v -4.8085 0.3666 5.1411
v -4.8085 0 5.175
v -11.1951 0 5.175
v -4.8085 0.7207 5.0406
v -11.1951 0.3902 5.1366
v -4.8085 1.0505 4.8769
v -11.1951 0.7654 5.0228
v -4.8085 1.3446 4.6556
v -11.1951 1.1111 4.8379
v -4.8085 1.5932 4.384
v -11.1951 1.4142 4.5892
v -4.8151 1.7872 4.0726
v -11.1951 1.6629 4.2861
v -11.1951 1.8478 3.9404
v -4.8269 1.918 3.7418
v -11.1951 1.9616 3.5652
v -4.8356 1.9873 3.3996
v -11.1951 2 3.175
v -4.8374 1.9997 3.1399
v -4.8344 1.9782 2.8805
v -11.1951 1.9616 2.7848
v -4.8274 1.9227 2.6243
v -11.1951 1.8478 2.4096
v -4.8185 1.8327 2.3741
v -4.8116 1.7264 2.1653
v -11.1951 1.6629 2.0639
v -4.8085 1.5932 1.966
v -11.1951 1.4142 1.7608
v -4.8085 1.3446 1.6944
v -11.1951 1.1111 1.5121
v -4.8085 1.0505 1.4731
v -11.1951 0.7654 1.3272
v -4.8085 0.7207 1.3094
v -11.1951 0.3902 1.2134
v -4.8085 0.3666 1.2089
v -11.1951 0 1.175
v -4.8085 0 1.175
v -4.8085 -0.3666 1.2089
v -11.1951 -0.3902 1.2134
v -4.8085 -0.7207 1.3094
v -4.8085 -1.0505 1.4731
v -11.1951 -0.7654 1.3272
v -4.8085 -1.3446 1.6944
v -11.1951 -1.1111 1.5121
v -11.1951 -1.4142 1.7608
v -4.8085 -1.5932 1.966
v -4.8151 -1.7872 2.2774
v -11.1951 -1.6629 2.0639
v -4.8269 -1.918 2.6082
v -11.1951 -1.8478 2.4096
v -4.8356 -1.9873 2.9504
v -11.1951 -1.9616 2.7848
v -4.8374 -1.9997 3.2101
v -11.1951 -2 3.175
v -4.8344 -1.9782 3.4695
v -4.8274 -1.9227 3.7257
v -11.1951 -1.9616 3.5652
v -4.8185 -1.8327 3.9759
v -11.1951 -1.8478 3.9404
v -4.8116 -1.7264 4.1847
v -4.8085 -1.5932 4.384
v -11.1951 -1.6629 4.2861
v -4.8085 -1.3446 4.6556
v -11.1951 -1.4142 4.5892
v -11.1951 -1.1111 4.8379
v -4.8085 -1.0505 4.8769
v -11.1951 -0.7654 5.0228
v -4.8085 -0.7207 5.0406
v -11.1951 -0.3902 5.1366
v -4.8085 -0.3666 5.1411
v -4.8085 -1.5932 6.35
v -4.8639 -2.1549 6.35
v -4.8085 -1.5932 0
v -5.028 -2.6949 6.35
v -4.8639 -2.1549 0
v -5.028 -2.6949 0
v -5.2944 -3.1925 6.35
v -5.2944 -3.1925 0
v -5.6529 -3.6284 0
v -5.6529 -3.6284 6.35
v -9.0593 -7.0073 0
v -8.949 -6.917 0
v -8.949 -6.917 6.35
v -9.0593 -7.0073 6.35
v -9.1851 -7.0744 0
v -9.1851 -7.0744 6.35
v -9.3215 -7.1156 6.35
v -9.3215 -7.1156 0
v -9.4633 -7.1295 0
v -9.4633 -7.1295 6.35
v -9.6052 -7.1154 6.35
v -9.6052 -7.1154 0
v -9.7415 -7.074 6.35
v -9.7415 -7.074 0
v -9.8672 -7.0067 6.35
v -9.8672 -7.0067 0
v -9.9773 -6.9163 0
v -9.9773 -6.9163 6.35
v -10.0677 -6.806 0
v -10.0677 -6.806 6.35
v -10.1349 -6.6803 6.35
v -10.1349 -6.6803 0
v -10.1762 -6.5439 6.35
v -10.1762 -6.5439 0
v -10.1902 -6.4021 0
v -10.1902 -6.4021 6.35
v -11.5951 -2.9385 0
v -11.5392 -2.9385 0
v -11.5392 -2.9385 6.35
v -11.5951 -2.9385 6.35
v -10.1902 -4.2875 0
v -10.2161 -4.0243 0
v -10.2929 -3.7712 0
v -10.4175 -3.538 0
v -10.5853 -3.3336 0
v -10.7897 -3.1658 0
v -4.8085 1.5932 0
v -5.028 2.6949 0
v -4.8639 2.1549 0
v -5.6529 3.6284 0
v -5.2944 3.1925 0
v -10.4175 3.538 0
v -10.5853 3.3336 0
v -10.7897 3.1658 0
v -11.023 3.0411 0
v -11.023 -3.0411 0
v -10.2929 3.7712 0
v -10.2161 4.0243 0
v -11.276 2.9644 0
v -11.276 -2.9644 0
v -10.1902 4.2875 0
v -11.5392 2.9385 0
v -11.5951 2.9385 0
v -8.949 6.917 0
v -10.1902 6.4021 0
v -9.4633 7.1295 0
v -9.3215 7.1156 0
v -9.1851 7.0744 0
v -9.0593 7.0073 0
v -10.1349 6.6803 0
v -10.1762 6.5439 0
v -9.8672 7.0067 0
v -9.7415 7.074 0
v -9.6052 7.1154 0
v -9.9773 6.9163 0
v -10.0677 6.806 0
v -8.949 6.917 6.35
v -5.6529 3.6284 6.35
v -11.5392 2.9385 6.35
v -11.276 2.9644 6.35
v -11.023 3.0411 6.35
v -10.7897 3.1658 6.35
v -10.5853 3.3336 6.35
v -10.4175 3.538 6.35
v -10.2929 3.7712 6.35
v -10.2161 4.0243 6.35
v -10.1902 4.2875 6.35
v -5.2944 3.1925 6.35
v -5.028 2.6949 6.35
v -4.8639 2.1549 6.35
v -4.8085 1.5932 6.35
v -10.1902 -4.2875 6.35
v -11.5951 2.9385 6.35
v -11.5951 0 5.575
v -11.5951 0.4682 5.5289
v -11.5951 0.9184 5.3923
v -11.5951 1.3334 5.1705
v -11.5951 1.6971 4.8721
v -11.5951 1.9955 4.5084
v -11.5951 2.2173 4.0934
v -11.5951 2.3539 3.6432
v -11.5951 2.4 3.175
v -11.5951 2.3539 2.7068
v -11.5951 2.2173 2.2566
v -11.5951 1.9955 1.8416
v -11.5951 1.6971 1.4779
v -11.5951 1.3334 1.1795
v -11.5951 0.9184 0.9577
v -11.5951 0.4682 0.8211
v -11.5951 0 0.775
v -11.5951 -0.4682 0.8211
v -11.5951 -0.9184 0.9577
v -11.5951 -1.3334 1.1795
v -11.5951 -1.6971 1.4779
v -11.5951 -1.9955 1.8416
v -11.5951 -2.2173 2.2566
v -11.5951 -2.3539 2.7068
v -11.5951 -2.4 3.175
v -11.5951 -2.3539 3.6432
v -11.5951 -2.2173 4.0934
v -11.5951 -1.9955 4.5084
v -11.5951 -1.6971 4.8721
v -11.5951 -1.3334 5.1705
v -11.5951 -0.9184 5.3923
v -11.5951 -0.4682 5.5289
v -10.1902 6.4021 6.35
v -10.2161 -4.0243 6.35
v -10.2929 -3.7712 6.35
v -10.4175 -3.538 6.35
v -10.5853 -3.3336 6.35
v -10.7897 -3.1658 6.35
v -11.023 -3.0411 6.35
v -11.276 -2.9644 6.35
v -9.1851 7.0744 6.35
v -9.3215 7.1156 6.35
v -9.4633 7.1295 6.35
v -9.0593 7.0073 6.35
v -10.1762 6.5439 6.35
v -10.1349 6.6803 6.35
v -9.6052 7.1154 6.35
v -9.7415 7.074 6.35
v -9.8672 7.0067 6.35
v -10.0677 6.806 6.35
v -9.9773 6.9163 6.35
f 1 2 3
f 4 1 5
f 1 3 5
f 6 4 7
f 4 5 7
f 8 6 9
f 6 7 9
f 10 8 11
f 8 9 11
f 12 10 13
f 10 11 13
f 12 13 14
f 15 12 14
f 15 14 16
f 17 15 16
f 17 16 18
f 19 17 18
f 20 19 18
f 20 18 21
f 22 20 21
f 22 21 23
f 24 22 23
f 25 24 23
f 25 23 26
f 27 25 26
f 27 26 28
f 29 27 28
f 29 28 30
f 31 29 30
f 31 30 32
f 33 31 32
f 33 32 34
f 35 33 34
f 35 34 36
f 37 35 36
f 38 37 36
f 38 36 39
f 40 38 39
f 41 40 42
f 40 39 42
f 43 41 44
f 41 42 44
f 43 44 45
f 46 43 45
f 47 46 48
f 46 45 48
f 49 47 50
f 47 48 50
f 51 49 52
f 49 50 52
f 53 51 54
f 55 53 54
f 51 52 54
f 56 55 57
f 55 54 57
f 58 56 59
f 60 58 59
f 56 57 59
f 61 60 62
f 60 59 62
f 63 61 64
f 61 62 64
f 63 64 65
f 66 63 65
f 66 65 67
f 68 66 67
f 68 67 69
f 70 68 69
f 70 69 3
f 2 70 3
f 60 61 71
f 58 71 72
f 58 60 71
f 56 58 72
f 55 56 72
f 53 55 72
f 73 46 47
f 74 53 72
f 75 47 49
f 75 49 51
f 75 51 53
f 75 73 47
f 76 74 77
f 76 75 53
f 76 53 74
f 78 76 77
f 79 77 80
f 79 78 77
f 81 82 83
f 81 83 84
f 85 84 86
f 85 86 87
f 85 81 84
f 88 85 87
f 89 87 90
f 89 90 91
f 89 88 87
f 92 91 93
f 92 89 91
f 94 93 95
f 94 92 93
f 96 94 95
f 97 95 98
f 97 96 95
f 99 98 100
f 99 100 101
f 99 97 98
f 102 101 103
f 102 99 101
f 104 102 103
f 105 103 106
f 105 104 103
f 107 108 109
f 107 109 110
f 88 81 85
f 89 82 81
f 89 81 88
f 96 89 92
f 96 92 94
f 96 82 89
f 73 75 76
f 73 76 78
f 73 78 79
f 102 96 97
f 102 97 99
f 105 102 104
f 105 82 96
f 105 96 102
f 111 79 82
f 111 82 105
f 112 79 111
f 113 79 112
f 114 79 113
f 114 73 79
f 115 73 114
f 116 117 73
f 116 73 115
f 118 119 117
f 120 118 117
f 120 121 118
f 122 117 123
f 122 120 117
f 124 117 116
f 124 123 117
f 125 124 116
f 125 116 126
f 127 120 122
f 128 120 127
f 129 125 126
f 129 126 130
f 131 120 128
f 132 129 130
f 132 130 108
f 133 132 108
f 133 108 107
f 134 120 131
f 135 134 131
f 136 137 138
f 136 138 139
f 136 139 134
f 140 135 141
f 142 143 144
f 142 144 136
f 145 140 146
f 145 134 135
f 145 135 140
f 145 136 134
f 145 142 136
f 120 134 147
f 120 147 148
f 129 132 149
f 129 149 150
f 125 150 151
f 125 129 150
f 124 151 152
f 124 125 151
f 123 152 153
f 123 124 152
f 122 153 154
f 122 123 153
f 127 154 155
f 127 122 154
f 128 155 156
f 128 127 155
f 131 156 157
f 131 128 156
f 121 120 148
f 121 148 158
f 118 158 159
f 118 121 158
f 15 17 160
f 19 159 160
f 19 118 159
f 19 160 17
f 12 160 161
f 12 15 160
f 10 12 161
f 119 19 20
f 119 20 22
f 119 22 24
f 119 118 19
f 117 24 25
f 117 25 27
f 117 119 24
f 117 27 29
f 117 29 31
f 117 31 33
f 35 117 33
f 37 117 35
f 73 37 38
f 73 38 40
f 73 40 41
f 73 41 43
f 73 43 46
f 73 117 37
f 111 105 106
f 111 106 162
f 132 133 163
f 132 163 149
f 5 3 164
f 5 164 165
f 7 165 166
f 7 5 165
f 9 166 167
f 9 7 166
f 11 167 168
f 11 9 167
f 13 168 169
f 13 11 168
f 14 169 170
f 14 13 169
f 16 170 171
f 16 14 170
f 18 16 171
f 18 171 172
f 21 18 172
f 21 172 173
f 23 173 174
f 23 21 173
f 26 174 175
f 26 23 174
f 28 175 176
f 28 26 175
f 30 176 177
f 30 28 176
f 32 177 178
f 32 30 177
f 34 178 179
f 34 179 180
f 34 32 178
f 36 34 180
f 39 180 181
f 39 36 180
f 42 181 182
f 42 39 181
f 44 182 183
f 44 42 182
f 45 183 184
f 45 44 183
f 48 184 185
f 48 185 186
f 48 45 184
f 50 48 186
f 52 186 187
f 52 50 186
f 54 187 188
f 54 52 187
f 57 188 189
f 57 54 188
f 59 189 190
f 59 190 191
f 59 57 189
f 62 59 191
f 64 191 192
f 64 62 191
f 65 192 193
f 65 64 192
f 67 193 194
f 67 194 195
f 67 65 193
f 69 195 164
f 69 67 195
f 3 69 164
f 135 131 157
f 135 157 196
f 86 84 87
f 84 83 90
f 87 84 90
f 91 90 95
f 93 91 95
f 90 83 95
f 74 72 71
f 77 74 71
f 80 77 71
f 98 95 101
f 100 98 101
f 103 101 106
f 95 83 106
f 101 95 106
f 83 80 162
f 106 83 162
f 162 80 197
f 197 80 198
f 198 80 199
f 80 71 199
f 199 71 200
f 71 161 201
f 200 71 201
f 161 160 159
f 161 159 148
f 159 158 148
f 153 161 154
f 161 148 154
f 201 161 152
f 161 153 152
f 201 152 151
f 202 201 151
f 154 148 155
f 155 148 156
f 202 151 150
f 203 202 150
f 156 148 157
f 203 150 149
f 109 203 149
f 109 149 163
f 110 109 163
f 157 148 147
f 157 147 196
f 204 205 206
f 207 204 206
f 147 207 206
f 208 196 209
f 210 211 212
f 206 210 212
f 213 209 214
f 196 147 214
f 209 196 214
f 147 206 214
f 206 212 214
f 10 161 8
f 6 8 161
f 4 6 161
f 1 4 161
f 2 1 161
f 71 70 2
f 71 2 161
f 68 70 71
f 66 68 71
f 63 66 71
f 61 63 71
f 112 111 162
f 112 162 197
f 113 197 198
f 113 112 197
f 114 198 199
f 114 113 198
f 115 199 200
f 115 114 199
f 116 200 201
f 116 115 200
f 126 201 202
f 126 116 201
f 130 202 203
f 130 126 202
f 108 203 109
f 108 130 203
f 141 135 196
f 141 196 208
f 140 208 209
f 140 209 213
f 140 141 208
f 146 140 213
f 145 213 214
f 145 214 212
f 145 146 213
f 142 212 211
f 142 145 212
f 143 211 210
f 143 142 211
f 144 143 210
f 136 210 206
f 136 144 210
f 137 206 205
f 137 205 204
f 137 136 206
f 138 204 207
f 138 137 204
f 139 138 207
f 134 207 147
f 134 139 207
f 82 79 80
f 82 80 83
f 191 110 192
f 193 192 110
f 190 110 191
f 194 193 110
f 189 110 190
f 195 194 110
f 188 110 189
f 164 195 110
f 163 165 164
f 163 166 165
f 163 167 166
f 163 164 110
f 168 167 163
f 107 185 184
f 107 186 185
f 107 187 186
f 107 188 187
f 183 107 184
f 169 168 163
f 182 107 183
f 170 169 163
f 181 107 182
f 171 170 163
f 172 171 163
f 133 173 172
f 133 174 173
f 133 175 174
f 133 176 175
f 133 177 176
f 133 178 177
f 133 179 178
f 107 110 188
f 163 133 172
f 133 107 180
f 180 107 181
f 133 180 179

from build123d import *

# Parameters (mm, degrees)
BOSS_EXTRUDE1_DEPTH = 6.35
CUT_EXTRUDE1_REACH  = 13.714
SKETCH2_R           = 2
FILLET1_SIZE        = 0.4


with BuildPart() as part:
    # Sketch1 → Boss-Extrude1 (new body)
    with BuildSketch(Plane.XY):
        with BuildLine():
            Line((-11.5951, -2.938456882), (-11.5951, 2.938456882))
            Line((-11.5951, 2.938456882), (-11.539212407, 2.938456882))
            ThreePointArc((-11.539212407, 2.938456882), (-10.585316586, 3.333573468), (-10.1902, 4.287469289))
            Line((-10.1902, 4.287469289), (-10.1902, 6.402089023))
            ThreePointArc((-10.1902, 6.402089023), (-9.74154152, 7.073969797), (-8.94902056, 6.917034355))
            Line((-8.94902056, 6.917034355), (-5.652895046, 3.628441884))
            ThreePointArc((-5.652895046, 3.628441884), (-5.027976112, 2.694919539), (-4.8085, 1.593185507))
            Line((-4.8085, 1.593185507), (-4.8085, -1.593185507))
            ThreePointArc((-4.8085, -1.593185507), (-5.027976112, -2.694919539), (-5.652895046, -3.628441884))
            Line((-5.652895046, -3.628441884), (-8.94902056, -6.917034355))
            ThreePointArc((-8.94902056, -6.917034355), (-9.74154152, -7.073969797), (-10.1902, -6.402089023))
            Line((-10.1902, -6.402089023), (-10.1902, -4.287469289))
            ThreePointArc((-10.1902, -4.287469289), (-10.585316586, -3.333573468), (-11.539212407, -2.938456882))
            Line((-11.539212407, -2.938456882), (-11.5951, -2.938456882))
        make_face()
    extrude(amount=BOSS_EXTRUDE1_DEPTH)

    # Sketch2 → Cut-Extrude1 (cut, up to next)
    with BuildSketch(Plane.ZY.offset(11.5951), mode=Mode.PRIVATE) as cut_extrude1_sk1:
        with Locations((3.175, 0)):
            Circle(SKETCH2_R)
    cut_extrude1_tool1 = extrude(cut_extrude1_sk1.sketch, amount=-CUT_EXTRUDE1_REACH, mode=Mode.PRIVATE) & part.part
    add(cut_extrude1_tool1.solids().sort_by_distance((-11.5951, 0, 3.175))[0], mode=Mode.SUBTRACT)

    # Fillet1
    fillet1_edges = [part.edges().sort_by_distance(p)[0] for p in [
        (-11.5951, 0, 1.175),
    ]]
    chamfer(fillet1_edges, length=FILLET1_SIZE)


solid = part.part
